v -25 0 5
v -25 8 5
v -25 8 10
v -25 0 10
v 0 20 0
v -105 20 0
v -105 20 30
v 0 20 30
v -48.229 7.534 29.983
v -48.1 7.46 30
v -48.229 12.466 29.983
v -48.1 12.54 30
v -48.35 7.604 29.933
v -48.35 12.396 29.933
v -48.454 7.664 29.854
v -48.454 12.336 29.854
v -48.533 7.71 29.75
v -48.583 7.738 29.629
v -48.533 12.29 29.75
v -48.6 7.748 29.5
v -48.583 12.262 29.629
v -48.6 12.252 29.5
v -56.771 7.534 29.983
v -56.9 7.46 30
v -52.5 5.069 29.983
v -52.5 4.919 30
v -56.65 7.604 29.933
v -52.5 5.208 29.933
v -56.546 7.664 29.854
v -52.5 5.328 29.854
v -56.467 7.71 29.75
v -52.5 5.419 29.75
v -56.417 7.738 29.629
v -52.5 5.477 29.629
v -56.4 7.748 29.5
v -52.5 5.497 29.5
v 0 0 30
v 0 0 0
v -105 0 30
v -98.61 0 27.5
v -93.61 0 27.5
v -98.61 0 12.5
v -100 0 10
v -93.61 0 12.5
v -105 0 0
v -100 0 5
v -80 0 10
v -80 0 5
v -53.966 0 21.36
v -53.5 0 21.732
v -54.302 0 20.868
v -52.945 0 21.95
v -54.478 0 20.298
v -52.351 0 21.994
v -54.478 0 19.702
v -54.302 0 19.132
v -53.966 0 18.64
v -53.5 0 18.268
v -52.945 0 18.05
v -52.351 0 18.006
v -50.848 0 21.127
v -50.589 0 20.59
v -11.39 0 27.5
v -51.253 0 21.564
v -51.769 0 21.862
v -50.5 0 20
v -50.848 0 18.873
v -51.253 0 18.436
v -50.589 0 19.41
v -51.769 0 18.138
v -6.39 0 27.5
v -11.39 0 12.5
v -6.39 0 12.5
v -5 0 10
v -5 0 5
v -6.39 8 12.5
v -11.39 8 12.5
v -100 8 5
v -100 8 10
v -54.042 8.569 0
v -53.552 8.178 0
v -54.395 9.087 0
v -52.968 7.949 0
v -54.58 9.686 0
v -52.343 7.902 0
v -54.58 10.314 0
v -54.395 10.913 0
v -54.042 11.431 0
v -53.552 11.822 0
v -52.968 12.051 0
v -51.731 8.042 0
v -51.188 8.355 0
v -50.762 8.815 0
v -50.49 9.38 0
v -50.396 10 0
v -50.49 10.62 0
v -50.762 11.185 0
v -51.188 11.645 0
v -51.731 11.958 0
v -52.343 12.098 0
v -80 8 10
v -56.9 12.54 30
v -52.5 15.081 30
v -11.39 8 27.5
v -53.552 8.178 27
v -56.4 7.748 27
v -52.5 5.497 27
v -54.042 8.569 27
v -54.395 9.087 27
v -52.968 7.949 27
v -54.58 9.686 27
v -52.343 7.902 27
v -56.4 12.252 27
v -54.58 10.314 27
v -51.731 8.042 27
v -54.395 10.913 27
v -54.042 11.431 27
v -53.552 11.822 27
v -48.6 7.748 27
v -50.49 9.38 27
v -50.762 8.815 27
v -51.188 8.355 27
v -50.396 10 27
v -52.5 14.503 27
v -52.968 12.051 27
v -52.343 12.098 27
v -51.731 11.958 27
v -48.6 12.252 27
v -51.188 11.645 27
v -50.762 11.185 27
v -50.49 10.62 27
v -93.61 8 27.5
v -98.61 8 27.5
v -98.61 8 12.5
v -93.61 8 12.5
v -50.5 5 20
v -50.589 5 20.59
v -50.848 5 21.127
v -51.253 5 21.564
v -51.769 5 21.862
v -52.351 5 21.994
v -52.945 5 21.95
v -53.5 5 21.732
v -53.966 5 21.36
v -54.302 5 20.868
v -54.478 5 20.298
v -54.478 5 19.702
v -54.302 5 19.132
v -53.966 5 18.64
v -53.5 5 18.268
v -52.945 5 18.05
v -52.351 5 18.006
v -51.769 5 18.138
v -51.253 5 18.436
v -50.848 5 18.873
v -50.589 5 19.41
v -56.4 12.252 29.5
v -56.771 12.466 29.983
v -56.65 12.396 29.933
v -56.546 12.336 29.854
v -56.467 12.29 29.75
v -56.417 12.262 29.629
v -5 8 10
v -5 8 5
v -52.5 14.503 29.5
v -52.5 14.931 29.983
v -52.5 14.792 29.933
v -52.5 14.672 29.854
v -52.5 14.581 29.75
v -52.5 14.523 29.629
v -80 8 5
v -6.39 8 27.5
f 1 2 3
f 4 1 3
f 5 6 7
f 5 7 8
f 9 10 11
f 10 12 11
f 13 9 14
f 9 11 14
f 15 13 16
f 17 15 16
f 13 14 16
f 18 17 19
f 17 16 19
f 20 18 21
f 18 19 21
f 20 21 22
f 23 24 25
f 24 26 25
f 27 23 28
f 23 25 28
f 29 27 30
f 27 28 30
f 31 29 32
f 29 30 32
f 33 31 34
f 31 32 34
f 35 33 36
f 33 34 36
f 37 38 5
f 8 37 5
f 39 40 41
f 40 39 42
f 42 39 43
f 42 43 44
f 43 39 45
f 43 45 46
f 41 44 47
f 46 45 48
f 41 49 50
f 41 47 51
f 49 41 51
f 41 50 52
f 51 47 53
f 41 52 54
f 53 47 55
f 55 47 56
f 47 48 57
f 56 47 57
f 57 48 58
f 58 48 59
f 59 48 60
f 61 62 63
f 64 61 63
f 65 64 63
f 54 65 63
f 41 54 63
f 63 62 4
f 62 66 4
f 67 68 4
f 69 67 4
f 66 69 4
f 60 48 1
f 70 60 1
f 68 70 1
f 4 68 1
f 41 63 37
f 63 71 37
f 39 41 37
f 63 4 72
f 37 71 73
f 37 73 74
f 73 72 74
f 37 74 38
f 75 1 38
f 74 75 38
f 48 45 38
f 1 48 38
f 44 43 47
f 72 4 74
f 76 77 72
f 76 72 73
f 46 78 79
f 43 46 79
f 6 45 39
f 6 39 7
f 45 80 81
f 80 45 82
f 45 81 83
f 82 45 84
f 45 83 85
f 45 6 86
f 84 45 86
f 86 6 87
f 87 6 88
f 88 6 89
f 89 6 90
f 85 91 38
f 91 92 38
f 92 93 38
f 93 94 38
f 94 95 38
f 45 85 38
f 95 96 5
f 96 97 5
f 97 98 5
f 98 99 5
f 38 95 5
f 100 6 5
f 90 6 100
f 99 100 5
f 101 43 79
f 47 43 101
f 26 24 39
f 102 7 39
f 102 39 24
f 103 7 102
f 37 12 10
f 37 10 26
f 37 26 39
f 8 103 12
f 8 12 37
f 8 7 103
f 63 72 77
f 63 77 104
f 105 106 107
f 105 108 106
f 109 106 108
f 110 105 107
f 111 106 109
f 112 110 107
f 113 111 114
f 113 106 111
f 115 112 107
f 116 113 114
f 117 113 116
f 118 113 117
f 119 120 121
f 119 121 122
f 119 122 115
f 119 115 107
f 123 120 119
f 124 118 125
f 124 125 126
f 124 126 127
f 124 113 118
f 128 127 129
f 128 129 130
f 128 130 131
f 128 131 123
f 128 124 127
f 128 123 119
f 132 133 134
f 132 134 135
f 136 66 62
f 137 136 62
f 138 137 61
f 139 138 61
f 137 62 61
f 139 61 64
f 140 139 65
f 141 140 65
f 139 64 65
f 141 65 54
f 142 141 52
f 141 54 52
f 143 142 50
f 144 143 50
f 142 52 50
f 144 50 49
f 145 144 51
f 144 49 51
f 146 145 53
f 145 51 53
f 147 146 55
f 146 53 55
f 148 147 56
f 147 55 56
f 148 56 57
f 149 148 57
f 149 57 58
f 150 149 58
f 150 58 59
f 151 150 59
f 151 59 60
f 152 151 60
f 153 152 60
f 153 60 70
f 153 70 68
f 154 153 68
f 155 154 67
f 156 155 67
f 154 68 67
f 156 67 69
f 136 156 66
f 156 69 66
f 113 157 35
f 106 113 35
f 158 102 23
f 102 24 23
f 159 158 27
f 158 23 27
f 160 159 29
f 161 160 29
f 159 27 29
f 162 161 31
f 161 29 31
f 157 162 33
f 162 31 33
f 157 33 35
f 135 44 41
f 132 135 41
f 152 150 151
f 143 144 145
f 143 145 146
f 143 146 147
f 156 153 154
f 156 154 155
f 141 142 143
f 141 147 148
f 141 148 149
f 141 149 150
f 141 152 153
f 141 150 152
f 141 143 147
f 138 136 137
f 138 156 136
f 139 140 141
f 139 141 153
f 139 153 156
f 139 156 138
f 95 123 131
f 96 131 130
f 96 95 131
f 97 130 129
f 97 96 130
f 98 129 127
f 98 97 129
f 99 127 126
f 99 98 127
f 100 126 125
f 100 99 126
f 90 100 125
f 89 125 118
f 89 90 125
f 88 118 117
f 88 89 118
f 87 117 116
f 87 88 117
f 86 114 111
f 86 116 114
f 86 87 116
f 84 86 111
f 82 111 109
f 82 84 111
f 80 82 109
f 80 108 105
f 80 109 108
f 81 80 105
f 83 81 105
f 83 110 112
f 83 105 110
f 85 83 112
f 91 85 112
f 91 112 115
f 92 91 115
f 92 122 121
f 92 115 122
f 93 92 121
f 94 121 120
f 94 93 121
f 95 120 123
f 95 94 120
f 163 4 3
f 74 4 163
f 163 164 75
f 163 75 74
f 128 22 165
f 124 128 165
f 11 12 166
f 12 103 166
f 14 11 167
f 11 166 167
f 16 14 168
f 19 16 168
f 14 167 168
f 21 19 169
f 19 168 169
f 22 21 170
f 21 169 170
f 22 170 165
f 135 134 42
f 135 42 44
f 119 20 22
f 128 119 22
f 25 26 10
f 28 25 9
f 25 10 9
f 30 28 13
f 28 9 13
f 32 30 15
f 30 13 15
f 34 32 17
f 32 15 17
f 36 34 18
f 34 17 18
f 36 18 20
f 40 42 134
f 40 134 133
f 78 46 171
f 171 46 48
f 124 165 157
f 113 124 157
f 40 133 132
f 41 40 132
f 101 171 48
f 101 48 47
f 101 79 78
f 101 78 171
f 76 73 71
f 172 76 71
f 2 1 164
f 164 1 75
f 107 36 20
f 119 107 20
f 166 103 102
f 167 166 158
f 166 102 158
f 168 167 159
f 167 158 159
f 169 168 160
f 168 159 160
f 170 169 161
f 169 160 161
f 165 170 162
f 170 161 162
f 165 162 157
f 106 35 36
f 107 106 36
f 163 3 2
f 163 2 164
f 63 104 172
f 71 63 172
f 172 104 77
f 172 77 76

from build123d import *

# Parameters (mm, degrees)
ESQUISSE1_W             = 105
ESQUISSE1_H             = 20
BOSS_EXTRU_1_DEPTH      = 30
ENL_V_MAT_EXTRU_1_DEPTH = 3
CONG_2_R                = 0.5
ESQUISSE8_R             = 2.103774153
ENL_V_MAT_EXTRU_3_DEPTH = 112.018016556
ESQUISSE9_R             = 2
ENL_V_MAT_EXTRU_5_DEPTH = 5
ESQUISSE10_W            = 20
ESQUISSE10_H            = 5
ESQUISSE10_W_2          = 5
ESQUISSE10_H_2          = 15
ENL_V_MAT_EXTRU_6_DEPTH = 8


with BuildPart() as part:
    # Esquisse1 → Boss.-Extru.1 (new body)
    with BuildSketch(Plane.XY):
        with Locations((-52.5, 10)):
            Rectangle(ESQUISSE1_W, ESQUISSE1_H)
    extrude(amount=BOSS_EXTRU_1_DEPTH)

    # Esquisse2 → Enlèv. mat.-Extru.1 (cut)
    with BuildSketch(Plane.XY.offset(30)):
        Polygon((-52.5, 5.4966679), (-48.6, 7.74833395), (-48.6, 12.25166605), (-52.5, 14.5033321), (-56.4, 12.25166605), (-56.4, 7.74833395), align=None)
    extrude(amount=-ENL_V_MAT_EXTRU_1_DEPTH, mode=Mode.SUBTRACT)

    # Congé2
    cong_2_edges = [part.edges().sort_by_distance(p)[0] for p in [
        (-54.45, 6.622500925, 30),
        (-50.55, 6.622500925, 30),
        (-48.6, 10, 30),
        (-50.55, 13.377499075, 30),
        (-54.45, 13.377499075, 30),
        (-56.4, 10, 30),
    ]]
    fillet(cong_2_edges, radius=CONG_2_R)

    # Esquisse8 → Enlèv. mat.-Extru.3 (cut, through all)
    with BuildSketch(Plane.XY):
        with Locations((-52.5, 10)):
            Circle(ESQUISSE8_R)
    extrude(amount=ENL_V_MAT_EXTRU_3_DEPTH, mode=Mode.SUBTRACT)

    # Esquisse9 → Enlèv. mat.-Extru.5 (cut)
    with BuildSketch(Plane.XZ):
        with Locations((-52.5, 20)):
            Circle(ESQUISSE9_R)
    extrude(amount=-ENL_V_MAT_EXTRU_5_DEPTH, mode=Mode.SUBTRACT)

    # Esquisse10 → Enlèv. mat.-Extru.6 (cut)
    with BuildSketch(Plane.XZ):
        with Locations((-15, 7.5)):
            Rectangle(ESQUISSE10_W, ESQUISSE10_H)
        with Locations((-8.89, 20)):
            Rectangle(ESQUISSE10_W_2, ESQUISSE10_H_2)
        with Locations((-96.11, 20)):
            Rectangle(ESQUISSE10_W_2, ESQUISSE10_H_2)
        with Locations((-90, 7.5)):
            Rectangle(ESQUISSE10_W, ESQUISSE10_H)
    extrude(amount=-ENL_V_MAT_EXTRU_6_DEPTH, mode=Mode.SUBTRACT)


solid = part.part
